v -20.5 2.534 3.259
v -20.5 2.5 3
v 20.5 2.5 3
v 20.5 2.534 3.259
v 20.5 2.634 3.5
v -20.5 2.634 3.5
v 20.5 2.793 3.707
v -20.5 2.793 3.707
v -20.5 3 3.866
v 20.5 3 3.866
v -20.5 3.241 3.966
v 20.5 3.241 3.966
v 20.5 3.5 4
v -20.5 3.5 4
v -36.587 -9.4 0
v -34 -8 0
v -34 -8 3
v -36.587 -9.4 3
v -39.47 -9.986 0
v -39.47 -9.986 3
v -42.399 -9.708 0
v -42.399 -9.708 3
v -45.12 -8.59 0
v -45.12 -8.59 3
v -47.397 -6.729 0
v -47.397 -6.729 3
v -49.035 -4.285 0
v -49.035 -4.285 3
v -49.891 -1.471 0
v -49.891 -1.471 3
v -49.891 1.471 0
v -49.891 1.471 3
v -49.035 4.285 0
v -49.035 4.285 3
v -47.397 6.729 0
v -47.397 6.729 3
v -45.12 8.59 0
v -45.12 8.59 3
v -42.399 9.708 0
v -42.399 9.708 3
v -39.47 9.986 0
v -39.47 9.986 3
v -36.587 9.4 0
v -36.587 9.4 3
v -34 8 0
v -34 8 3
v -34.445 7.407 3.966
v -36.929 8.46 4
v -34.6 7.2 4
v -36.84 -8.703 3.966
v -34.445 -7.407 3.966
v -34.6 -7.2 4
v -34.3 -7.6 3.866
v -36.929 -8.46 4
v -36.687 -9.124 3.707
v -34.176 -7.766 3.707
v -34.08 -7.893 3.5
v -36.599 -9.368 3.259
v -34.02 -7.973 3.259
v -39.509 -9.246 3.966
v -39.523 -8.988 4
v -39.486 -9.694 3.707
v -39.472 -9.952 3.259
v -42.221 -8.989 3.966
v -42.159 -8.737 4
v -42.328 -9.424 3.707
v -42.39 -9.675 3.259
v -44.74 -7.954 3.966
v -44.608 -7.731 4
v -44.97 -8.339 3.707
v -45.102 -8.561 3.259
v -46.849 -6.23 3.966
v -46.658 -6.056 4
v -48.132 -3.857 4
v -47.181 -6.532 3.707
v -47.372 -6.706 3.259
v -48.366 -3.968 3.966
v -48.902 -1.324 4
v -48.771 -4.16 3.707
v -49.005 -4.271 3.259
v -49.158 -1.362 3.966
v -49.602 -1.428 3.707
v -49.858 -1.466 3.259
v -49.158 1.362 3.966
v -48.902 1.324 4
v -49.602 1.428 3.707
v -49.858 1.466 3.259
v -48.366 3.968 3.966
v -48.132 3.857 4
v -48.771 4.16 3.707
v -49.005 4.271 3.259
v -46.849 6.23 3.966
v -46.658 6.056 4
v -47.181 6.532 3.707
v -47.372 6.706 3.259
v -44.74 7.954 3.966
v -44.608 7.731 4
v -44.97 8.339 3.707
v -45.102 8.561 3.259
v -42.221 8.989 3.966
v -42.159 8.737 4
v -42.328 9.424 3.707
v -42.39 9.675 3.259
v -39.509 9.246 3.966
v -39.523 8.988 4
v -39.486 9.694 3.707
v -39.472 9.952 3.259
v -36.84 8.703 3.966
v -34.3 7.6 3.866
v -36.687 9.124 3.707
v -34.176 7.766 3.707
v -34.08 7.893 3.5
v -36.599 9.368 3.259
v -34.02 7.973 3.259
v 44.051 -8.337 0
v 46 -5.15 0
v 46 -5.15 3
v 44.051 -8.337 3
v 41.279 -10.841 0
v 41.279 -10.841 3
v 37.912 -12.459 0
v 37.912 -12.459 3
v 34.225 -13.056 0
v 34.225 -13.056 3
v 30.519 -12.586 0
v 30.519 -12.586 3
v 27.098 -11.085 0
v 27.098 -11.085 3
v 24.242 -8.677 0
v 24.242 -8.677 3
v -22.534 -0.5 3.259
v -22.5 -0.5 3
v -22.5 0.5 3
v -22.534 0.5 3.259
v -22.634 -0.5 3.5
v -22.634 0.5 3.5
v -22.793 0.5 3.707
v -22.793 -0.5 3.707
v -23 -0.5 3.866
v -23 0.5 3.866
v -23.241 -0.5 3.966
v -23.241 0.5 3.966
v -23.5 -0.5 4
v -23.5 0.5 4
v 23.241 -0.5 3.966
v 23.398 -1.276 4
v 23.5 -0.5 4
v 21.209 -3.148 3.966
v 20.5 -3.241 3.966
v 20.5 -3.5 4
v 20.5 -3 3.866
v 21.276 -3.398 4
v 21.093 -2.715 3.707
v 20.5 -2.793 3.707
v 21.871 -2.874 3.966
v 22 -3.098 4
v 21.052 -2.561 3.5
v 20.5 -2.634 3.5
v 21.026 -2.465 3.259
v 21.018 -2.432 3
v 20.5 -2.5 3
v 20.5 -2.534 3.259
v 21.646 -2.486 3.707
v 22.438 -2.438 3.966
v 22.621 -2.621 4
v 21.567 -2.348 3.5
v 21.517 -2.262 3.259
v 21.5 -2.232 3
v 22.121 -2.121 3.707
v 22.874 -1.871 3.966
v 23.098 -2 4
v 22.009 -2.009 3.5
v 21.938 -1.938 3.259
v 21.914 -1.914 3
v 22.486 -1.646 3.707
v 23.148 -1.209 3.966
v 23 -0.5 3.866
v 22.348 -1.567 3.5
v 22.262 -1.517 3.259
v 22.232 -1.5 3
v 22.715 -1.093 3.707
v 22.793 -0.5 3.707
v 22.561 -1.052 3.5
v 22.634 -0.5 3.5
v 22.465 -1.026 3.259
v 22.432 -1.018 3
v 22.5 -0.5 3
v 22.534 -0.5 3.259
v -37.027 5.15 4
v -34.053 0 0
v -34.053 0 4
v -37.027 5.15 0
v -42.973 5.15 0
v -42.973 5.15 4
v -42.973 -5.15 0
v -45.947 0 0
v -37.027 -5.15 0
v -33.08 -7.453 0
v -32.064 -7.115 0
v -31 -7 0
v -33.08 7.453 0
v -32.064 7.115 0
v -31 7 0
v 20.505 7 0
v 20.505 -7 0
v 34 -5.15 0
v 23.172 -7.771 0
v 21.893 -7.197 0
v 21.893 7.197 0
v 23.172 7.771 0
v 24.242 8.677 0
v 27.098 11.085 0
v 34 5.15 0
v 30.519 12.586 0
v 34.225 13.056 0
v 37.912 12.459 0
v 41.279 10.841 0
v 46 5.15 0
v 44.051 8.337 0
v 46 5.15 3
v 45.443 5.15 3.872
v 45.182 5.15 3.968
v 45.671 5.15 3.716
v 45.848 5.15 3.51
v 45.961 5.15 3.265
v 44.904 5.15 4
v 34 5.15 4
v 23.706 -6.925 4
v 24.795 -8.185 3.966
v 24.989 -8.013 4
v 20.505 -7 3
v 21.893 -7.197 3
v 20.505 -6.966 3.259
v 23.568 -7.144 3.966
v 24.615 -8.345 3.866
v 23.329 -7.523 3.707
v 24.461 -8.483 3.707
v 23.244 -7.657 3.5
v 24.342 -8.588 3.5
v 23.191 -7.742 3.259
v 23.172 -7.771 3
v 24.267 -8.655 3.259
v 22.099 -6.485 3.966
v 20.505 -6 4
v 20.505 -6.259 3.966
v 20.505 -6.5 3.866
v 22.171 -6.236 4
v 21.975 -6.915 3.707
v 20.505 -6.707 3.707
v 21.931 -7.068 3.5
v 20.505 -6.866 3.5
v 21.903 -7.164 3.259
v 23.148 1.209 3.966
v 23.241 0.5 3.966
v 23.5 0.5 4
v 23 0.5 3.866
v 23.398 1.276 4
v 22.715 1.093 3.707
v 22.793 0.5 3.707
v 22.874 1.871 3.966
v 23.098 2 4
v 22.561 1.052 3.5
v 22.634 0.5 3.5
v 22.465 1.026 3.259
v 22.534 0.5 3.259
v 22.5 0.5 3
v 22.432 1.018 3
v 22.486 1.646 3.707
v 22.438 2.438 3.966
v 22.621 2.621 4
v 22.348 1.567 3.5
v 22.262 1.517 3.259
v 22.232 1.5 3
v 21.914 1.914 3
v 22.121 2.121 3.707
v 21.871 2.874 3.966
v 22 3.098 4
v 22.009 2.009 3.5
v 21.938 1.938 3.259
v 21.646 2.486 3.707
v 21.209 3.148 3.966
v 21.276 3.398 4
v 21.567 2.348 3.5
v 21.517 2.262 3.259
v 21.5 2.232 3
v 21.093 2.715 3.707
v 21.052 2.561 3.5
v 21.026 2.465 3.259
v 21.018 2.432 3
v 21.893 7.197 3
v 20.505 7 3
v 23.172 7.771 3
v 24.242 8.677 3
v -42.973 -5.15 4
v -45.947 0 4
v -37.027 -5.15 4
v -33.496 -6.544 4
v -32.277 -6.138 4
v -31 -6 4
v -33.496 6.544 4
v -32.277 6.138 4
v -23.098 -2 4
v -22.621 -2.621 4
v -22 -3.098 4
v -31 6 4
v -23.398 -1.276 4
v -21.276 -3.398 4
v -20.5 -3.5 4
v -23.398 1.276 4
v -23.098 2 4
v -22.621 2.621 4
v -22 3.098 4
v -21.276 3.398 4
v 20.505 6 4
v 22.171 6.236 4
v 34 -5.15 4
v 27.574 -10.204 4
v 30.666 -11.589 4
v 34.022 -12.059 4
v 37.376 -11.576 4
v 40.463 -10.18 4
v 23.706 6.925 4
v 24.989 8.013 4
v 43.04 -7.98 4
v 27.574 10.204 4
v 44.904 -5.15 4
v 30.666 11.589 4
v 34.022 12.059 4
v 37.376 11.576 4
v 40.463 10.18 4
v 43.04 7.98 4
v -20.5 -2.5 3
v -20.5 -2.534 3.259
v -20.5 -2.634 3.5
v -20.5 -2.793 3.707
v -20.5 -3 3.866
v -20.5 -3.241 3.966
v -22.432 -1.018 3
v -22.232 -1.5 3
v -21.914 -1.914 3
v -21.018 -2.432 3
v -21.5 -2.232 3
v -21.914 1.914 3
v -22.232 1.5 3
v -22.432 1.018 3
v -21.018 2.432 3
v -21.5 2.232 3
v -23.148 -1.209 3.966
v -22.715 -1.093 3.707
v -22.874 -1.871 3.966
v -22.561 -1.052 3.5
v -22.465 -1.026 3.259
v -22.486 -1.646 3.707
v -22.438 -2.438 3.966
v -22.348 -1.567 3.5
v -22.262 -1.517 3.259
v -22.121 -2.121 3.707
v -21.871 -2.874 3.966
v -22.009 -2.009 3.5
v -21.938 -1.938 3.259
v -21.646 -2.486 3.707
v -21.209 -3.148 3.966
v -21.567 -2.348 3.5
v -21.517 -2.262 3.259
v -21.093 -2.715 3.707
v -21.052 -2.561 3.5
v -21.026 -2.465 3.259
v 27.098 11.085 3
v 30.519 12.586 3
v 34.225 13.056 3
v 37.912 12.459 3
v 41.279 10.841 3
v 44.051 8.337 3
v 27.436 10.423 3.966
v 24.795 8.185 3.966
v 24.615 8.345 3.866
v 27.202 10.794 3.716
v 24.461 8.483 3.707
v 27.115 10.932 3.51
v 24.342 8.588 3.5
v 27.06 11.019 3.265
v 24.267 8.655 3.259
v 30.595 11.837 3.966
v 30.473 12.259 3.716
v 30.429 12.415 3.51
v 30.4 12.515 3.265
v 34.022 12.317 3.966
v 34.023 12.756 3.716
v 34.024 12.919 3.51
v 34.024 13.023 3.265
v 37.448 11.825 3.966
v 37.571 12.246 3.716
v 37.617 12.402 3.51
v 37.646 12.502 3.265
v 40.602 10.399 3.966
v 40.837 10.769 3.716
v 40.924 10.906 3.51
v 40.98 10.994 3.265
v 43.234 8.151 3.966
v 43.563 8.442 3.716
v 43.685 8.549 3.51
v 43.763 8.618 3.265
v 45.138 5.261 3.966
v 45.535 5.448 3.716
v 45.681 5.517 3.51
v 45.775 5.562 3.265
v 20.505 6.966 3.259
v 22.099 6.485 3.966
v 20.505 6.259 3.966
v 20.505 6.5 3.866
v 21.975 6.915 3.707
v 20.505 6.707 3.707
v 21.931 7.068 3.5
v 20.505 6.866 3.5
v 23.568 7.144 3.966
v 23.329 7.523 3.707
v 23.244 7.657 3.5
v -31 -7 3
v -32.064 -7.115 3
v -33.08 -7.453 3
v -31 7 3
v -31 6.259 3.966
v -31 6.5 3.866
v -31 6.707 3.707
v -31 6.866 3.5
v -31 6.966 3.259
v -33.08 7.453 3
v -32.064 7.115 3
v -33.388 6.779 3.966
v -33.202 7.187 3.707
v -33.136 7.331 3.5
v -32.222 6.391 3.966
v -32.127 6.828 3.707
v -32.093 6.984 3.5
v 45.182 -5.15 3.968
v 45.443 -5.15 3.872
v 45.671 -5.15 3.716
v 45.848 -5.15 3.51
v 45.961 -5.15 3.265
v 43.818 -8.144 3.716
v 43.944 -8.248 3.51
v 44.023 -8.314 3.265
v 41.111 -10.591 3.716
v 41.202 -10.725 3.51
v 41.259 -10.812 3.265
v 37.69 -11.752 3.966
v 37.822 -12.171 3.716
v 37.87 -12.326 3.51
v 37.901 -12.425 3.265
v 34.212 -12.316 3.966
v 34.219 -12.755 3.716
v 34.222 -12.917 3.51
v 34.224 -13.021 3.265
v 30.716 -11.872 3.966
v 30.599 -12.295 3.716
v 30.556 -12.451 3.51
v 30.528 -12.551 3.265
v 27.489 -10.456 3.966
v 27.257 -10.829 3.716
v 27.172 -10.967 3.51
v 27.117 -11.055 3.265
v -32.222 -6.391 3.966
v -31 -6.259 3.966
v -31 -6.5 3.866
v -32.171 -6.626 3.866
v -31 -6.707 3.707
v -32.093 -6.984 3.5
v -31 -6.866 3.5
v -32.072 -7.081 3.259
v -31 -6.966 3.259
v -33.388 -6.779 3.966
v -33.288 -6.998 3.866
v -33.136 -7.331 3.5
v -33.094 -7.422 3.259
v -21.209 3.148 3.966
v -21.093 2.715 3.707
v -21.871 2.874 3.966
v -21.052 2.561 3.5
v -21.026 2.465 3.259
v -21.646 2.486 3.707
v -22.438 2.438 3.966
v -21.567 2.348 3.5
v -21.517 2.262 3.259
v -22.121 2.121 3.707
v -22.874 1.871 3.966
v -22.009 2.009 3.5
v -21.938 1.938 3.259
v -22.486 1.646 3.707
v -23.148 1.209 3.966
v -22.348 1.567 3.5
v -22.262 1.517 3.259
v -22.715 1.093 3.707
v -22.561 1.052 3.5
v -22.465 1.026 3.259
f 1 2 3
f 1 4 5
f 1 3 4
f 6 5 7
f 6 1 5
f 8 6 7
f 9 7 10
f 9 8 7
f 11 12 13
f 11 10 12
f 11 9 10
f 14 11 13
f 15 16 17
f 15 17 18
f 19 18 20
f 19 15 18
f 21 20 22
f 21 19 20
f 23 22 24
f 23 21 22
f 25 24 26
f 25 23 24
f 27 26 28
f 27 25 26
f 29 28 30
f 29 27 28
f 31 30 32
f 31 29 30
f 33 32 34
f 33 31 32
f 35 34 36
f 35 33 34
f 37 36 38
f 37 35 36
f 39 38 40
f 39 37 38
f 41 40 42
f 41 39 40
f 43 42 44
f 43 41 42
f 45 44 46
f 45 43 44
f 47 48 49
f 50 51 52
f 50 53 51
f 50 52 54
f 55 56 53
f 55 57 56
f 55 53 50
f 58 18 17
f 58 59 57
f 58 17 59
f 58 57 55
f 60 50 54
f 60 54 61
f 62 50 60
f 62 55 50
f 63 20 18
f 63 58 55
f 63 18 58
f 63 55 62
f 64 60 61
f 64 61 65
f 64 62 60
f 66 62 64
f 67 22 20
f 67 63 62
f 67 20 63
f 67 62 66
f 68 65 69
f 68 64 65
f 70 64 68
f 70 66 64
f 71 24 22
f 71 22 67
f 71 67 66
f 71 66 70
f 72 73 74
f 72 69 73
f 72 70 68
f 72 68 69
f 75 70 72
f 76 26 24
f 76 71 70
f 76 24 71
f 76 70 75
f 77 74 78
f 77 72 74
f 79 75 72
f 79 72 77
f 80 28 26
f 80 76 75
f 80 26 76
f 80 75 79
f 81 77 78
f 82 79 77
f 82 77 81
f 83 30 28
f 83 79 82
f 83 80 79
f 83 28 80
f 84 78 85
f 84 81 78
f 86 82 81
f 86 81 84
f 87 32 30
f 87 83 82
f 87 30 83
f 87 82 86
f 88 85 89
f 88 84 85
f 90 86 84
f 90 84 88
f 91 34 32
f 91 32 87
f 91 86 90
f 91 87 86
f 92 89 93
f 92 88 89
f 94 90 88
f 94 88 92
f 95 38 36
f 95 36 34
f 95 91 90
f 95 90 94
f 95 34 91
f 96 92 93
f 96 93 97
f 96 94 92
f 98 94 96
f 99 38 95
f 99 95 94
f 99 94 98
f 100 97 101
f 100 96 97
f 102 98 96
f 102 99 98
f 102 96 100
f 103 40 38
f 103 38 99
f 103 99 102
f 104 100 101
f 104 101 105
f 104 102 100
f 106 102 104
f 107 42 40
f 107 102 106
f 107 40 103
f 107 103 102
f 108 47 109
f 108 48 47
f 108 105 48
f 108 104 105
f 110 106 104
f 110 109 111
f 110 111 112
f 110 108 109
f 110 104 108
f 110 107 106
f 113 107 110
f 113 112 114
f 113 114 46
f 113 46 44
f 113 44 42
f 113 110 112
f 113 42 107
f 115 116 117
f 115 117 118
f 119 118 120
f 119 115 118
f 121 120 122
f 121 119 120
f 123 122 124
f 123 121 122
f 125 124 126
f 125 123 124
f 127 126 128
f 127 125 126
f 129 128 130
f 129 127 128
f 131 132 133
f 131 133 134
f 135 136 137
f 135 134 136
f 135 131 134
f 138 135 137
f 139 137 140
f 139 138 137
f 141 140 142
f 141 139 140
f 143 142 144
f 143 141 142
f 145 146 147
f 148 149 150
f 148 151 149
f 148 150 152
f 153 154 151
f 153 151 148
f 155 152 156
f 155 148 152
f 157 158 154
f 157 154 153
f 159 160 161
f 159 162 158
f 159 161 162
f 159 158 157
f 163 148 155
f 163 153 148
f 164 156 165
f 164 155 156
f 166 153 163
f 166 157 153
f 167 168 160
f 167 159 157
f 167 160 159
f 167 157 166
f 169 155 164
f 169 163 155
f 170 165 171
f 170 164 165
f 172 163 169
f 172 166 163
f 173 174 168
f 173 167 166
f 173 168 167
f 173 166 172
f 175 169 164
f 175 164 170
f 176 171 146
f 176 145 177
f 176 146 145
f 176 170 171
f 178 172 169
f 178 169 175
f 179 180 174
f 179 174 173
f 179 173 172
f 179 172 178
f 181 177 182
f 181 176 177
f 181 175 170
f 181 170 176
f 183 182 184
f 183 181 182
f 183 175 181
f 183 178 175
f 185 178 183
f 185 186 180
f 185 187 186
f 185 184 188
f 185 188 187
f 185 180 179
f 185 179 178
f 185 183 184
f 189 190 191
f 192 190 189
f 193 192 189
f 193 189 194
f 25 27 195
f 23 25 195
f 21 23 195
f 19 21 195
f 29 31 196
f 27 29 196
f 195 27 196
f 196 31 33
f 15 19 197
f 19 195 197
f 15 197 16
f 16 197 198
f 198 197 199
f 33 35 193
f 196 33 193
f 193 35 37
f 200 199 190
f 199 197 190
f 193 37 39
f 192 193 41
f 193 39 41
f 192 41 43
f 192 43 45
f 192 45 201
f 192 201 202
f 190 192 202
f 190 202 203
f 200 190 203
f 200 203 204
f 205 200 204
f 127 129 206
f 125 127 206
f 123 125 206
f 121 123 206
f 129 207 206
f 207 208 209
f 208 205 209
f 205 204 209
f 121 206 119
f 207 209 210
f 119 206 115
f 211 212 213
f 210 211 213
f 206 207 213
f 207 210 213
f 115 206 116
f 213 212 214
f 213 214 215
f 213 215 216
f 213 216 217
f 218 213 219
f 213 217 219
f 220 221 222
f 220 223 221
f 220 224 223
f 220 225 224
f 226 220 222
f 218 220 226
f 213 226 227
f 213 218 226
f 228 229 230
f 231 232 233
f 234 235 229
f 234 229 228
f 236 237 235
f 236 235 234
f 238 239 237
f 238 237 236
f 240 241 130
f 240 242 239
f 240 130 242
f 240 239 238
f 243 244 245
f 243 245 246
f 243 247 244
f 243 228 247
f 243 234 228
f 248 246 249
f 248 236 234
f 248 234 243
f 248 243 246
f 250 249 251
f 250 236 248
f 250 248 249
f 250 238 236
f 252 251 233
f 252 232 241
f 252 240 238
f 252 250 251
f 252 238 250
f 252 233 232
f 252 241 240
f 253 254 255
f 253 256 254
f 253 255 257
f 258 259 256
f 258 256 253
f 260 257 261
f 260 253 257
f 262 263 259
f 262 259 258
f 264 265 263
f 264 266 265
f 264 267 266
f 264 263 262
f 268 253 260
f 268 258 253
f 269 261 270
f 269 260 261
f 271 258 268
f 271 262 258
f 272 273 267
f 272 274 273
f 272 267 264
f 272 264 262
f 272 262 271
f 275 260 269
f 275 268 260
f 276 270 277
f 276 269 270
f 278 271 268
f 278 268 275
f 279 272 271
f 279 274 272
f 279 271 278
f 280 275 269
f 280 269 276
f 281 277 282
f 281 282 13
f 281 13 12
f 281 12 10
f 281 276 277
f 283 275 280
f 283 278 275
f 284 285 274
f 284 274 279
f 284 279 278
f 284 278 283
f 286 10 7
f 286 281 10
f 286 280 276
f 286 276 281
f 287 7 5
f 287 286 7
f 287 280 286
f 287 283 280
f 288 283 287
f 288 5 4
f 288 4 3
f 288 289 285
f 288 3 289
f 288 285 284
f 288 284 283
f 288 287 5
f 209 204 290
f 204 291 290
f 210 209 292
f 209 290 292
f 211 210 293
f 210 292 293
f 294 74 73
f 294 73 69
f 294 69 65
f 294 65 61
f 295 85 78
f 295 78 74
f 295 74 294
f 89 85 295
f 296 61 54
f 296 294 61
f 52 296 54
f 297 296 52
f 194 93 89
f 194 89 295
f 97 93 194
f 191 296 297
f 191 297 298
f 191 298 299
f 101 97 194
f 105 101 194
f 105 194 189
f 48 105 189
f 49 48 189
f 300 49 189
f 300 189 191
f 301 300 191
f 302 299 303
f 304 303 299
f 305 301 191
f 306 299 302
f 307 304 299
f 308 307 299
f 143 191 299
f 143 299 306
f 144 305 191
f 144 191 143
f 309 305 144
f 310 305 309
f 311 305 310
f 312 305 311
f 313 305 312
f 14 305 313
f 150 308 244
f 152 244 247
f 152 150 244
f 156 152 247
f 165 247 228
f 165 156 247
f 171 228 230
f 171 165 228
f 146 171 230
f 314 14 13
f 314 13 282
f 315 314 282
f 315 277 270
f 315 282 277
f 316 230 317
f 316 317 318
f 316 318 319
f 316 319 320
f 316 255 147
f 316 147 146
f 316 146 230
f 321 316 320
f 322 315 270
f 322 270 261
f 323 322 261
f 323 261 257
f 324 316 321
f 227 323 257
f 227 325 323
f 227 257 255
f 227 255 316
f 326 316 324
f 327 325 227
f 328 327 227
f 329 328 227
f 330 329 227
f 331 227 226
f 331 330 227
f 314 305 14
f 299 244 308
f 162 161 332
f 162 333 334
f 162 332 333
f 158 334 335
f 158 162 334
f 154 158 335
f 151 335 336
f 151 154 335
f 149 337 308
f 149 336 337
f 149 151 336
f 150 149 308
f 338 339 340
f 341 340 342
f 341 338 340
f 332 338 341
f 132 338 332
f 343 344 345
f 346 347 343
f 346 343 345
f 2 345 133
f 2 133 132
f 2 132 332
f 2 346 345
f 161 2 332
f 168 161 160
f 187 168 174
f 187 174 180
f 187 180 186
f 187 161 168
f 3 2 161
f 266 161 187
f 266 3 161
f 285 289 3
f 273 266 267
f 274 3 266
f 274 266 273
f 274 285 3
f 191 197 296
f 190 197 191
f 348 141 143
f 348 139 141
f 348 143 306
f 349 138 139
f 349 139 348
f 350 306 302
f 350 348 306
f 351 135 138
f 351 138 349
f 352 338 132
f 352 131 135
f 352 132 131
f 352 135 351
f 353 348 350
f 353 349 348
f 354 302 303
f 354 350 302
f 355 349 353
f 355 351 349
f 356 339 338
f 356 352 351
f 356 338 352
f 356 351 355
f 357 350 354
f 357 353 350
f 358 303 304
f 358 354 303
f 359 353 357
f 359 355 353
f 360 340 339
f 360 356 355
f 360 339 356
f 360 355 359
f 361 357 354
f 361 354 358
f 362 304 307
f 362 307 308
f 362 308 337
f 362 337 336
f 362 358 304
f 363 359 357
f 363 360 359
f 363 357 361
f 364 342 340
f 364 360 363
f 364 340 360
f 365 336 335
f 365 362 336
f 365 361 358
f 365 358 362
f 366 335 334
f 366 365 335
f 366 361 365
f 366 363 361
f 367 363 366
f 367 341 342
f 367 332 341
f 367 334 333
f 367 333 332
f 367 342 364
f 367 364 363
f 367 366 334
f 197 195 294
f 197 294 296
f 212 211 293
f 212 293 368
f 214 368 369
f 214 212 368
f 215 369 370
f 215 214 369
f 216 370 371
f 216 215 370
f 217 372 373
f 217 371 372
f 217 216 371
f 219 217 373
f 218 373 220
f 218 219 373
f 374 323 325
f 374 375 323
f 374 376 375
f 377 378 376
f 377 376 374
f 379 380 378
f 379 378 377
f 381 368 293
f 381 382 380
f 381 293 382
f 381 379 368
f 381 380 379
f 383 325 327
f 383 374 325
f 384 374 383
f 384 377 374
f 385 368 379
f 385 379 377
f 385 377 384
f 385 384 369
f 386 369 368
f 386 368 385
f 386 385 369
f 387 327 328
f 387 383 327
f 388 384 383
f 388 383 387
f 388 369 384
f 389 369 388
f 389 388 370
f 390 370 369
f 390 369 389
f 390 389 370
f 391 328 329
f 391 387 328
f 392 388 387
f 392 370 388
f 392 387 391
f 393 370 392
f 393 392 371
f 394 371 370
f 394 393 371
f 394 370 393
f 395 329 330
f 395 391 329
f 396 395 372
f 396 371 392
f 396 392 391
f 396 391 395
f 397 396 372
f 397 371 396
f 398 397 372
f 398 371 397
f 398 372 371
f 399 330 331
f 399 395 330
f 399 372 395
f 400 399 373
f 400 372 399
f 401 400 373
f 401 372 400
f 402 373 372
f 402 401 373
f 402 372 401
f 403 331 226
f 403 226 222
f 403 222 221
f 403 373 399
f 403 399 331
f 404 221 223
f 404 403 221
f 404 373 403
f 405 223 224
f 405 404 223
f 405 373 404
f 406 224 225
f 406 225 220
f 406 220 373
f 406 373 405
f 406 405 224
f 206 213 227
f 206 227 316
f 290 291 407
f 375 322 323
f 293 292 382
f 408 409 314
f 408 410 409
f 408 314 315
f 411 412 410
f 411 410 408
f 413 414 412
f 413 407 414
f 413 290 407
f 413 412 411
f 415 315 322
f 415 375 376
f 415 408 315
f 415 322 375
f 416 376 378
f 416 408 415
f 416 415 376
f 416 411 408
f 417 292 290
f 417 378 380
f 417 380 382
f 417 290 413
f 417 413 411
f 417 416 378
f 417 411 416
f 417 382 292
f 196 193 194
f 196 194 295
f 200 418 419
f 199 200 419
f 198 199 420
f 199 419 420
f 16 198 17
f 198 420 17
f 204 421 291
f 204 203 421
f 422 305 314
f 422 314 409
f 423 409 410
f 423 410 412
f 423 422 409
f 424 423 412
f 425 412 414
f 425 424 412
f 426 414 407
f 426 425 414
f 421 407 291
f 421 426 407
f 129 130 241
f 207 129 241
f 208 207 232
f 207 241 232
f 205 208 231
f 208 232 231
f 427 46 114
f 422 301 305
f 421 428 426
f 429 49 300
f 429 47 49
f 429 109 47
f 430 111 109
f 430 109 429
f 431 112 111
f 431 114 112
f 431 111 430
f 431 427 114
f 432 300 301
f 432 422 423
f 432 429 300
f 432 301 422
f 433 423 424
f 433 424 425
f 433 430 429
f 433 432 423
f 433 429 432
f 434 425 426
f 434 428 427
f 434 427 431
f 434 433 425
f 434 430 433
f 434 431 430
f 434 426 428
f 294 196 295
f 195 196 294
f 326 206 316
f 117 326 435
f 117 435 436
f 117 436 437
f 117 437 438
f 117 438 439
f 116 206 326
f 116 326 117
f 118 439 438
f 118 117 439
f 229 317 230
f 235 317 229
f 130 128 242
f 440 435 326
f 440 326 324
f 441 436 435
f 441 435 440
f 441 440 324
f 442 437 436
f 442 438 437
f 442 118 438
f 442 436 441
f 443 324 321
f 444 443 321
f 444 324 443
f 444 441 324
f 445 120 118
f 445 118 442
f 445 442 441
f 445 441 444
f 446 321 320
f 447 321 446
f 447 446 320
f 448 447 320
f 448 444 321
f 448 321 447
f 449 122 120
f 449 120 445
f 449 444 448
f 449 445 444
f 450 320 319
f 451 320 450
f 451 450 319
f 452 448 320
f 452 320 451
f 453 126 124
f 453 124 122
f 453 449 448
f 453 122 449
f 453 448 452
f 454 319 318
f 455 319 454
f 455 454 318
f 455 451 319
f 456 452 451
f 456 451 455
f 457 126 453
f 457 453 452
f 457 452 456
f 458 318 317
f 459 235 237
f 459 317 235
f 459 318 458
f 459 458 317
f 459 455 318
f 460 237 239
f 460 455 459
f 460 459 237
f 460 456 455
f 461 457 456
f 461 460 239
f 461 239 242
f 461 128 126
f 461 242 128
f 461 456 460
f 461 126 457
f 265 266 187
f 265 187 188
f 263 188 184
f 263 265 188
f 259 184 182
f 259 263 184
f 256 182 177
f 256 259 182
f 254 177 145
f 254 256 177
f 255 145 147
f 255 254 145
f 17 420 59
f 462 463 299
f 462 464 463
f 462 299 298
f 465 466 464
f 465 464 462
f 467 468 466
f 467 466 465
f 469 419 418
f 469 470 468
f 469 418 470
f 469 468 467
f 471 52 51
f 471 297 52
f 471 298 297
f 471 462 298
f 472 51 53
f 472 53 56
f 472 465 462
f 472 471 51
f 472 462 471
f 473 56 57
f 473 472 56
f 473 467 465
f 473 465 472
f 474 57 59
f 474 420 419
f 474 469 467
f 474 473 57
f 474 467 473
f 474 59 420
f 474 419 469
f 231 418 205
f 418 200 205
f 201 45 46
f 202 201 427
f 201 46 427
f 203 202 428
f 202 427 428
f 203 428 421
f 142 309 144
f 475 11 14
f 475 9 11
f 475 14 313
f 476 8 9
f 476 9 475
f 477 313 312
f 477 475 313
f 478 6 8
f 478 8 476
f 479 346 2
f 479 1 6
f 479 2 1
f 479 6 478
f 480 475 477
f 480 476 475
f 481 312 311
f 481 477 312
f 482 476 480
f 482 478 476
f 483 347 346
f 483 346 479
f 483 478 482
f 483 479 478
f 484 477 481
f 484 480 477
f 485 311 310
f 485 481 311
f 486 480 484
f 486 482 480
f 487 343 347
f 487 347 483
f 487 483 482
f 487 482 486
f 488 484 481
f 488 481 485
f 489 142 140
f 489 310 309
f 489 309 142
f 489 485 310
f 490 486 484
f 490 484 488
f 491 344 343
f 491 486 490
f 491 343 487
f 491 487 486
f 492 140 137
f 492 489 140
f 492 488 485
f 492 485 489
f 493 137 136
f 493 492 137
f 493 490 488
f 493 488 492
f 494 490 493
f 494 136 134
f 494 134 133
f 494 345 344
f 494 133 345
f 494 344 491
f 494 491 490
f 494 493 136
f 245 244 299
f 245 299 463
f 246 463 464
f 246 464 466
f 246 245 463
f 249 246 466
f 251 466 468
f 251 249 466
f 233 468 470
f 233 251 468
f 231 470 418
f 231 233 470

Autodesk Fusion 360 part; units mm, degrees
sketch "Sketch1" plane through (0, 0, 0) normal (0, 0, 1) x (1, 0, 0)
  line L0 (-42.9734, 5.15) -> (-45.9467, 0)
  line L1 (-45.9467, 0) -> (-42.9734, -5.15)
  line L2 (-42.9734, -5.15) -> (-37.0266, -5.15)
  line L3 (-37.0266, -5.15) -> (-34.0533, 0)
  line L4 (-34.0533, 0) -> (-37.0266, 5.15)
  line L5 (-37.0266, 5.15) -> (-42.9734, 5.15)
  line L6 (46, 5.15) -> (34, 5.15)
  line L7 (34, 5.15) -> (34, -5.15)
  line L8 (34, -5.15) -> (46, -5.15)
  line L9 (46, 5.15) -> (34, -5.15) construction
  line L10 (34, 5.15) -> (46, -5.15) construction
  line L11 (-32.8586, 7) -> (22.9763, 7)
  arc A0 (-32.8586, 7) -> (-32.8586, -7) centre (-40, 0) ccw
  arc A1 (22.9763, -7) -> (46, -5.15) centre (34, 0) ccw
  arc A2 (46, 5.15) -> (22.9763, 7) centre (34, 0) ccw
  line L12 (-32.8586, -7) -> (22.9763, -7)
  point P0 (-40, 0)
  point P1 (40, 0)
  dimension "d1" = 80
  dimension "d2" = 5.15
  dimension "d3" = 20
  dimension "d4" = 12
  dimension "d5" = 10.3
sketch "Sketch2" plane through (0, 0, 0) normal (0, 0, 1) x (1, 0, 0)
extrude "Extrude1" add sketch "Sketch1" along normal blind 4
fillet "Fillet1" radius 5 4 edges at (-32.8586, -7, 2) (22.9763, -7, 2) (22.9763, 7, 2) (-32.8586, 7, 2)
sketch "Sketch3" plane through (0, 0, 4) normal (0, 0, 1) x (1, 0, 0)
  line L0 (-42.9734, 5.15) -> (-37.0266, 5.15)
  line L1 (-37.0266, 5.15) -> (-34.0533, 0)
  line L2 (-34.0533, 0) -> (-37.0266, -5.15)
  line L3 (-37.0266, -5.15) -> (-42.9734, -5.15)
  line L4 (-42.9734, -5.15) -> (-45.9467, 0)
  line L5 (-45.9467, 0) -> (-42.9734, 5.15)
  arc A0 (-34, 8) -> (-34, -8) centre (-40, 0) ccw
  arc A1 (-31, -7) -> (-34, -8) centre (-31, -12) ccw
  line L6 (-31, -7) -> (20.5053, -7)
  arc A2 (24.2417, -8.6775) -> (20.5053, -7) centre (20.5053, -12) ccw
  arc A3 (24.2417, -8.6775) -> (46, -5.15) centre (34, 0) ccw
  line L7 (46, -5.15) -> (34, -5.15)
  line L8 (34, -5.15) -> (34, 5.15)
  line L9 (34, 5.15) -> (46, 5.15)
  arc A4 (46, 5.15) -> (24.2417, 8.6775) centre (34, 0) ccw
  arc A5 (20.5053, 7) -> (24.2417, 8.6775) centre (20.5053, 12) ccw
  line L10 (20.5053, 7) -> (-31, 7)
  arc A6 (-34, 8) -> (-31, 7) centre (-31, 12) ccw
  line L11 (-22.5, 2.5) -> (22.5, 2.5)
  line L12 (22.5, 2.5) -> (22.5, -2.5)
  line L13 (22.5, -2.5) -> (-22.5, -2.5)
  line L14 (-22.5, -2.5) -> (-22.5, 2.5)
  line L15 (-22.5, 2.5) -> (22.5, -2.5) construction
  line L16 (22.5, 2.5) -> (-22.5, -2.5) construction
  dimension "d11" = 45
  dimension "d12" = 5
extrude "Extrude2" cut sketch "Sketch3" against normal blind 1 contours L11 L12 L13 L14
sketch "Sketch4" plane through (0, 0, 4) normal (0, 0, 1) x (1, 0, 0)
  line L0 (22.5, 2.5) -> (22.5, -2.5)
  line L1 (22.5, -2.5) -> (-22.5, -2.5)
  line L2 (-22.5, -2.5) -> (-22.5, 2.5)
  line L3 (-22.5, 2.5) -> (22.5, 2.5)
  line L4 (-42.9734, 5.15) -> (-37.0266, 5.15)
  line L5 (-37.0266, 5.15) -> (-34.0533, 0)
  line L6 (-34.0533, 0) -> (-37.0266, -5.15)
  line L7 (-37.0266, -5.15) -> (-42.9734, -5.15)
  line L8 (-42.9734, -5.15) -> (-45.9467, 0)
  line L9 (-45.9467, 0) -> (-42.9734, 5.15)
  arc A0 (-34, 8) -> (-34, -8) centre (-40, 0) ccw
  arc A1 (-31, -7) -> (-34, -8) centre (-31, -12) ccw
  line L10 (-31, -7) -> (20.5053, -7)
  arc A2 (24.2417, -8.6775) -> (20.5053, -7) centre (20.5053, -12) ccw
  arc A3 (24.2417, -8.6775) -> (46, -5.15) centre (34, 0) ccw
  line L11 (46, -5.15) -> (34, -5.15)
  line L12 (34, -5.15) -> (34, 5.15)
  line L13 (34, 5.15) -> (46, 5.15)
  arc A4 (46, 5.15) -> (24.2417, 8.6775) centre (34, 0) ccw
  arc A5 (20.5053, 7) -> (24.2417, 8.6775) centre (20.5053, 12) ccw
  line L14 (20.5053, 7) -> (-31, 7)
  arc A6 (-34, 8) -> (-31, 7) centre (-31, 12) ccw
sketch "Sketch5" plane through (0, 0, 4) normal (0, 0, 1) x (1, 0, 0)
fillet "Fillet2" radius 2 4 edges at (-22.5, 2.5, 3.5) (-22.5, -2.5, 3.5) (22.5, 2.5, 3.5) (22.5, -2.5, 3.5)
fillet "Fillet3" radius 1 17 edges at (21.9142, 1.9142, 4) (22.5, 0, 4) (21.9142, -1.9142, 4) (0, -2.5, 4) (-21.9142, -1.9142, 4) (-22.5, 0, 4) (-21.9142, 1.9142, 4) (0, 2.5, 4) (36.0897, 12.8901, 4) (22.5531, 7.4386, 4) (-5.2473, 7, 4) (-32.5811, 7.2566, 4) (-50, 0, 4) (-32.5811, -7.2566, 4) (-5.2473, -7, 4) (22.5531, -7.4386, 4) (36.0897, -12.8901, 4)
